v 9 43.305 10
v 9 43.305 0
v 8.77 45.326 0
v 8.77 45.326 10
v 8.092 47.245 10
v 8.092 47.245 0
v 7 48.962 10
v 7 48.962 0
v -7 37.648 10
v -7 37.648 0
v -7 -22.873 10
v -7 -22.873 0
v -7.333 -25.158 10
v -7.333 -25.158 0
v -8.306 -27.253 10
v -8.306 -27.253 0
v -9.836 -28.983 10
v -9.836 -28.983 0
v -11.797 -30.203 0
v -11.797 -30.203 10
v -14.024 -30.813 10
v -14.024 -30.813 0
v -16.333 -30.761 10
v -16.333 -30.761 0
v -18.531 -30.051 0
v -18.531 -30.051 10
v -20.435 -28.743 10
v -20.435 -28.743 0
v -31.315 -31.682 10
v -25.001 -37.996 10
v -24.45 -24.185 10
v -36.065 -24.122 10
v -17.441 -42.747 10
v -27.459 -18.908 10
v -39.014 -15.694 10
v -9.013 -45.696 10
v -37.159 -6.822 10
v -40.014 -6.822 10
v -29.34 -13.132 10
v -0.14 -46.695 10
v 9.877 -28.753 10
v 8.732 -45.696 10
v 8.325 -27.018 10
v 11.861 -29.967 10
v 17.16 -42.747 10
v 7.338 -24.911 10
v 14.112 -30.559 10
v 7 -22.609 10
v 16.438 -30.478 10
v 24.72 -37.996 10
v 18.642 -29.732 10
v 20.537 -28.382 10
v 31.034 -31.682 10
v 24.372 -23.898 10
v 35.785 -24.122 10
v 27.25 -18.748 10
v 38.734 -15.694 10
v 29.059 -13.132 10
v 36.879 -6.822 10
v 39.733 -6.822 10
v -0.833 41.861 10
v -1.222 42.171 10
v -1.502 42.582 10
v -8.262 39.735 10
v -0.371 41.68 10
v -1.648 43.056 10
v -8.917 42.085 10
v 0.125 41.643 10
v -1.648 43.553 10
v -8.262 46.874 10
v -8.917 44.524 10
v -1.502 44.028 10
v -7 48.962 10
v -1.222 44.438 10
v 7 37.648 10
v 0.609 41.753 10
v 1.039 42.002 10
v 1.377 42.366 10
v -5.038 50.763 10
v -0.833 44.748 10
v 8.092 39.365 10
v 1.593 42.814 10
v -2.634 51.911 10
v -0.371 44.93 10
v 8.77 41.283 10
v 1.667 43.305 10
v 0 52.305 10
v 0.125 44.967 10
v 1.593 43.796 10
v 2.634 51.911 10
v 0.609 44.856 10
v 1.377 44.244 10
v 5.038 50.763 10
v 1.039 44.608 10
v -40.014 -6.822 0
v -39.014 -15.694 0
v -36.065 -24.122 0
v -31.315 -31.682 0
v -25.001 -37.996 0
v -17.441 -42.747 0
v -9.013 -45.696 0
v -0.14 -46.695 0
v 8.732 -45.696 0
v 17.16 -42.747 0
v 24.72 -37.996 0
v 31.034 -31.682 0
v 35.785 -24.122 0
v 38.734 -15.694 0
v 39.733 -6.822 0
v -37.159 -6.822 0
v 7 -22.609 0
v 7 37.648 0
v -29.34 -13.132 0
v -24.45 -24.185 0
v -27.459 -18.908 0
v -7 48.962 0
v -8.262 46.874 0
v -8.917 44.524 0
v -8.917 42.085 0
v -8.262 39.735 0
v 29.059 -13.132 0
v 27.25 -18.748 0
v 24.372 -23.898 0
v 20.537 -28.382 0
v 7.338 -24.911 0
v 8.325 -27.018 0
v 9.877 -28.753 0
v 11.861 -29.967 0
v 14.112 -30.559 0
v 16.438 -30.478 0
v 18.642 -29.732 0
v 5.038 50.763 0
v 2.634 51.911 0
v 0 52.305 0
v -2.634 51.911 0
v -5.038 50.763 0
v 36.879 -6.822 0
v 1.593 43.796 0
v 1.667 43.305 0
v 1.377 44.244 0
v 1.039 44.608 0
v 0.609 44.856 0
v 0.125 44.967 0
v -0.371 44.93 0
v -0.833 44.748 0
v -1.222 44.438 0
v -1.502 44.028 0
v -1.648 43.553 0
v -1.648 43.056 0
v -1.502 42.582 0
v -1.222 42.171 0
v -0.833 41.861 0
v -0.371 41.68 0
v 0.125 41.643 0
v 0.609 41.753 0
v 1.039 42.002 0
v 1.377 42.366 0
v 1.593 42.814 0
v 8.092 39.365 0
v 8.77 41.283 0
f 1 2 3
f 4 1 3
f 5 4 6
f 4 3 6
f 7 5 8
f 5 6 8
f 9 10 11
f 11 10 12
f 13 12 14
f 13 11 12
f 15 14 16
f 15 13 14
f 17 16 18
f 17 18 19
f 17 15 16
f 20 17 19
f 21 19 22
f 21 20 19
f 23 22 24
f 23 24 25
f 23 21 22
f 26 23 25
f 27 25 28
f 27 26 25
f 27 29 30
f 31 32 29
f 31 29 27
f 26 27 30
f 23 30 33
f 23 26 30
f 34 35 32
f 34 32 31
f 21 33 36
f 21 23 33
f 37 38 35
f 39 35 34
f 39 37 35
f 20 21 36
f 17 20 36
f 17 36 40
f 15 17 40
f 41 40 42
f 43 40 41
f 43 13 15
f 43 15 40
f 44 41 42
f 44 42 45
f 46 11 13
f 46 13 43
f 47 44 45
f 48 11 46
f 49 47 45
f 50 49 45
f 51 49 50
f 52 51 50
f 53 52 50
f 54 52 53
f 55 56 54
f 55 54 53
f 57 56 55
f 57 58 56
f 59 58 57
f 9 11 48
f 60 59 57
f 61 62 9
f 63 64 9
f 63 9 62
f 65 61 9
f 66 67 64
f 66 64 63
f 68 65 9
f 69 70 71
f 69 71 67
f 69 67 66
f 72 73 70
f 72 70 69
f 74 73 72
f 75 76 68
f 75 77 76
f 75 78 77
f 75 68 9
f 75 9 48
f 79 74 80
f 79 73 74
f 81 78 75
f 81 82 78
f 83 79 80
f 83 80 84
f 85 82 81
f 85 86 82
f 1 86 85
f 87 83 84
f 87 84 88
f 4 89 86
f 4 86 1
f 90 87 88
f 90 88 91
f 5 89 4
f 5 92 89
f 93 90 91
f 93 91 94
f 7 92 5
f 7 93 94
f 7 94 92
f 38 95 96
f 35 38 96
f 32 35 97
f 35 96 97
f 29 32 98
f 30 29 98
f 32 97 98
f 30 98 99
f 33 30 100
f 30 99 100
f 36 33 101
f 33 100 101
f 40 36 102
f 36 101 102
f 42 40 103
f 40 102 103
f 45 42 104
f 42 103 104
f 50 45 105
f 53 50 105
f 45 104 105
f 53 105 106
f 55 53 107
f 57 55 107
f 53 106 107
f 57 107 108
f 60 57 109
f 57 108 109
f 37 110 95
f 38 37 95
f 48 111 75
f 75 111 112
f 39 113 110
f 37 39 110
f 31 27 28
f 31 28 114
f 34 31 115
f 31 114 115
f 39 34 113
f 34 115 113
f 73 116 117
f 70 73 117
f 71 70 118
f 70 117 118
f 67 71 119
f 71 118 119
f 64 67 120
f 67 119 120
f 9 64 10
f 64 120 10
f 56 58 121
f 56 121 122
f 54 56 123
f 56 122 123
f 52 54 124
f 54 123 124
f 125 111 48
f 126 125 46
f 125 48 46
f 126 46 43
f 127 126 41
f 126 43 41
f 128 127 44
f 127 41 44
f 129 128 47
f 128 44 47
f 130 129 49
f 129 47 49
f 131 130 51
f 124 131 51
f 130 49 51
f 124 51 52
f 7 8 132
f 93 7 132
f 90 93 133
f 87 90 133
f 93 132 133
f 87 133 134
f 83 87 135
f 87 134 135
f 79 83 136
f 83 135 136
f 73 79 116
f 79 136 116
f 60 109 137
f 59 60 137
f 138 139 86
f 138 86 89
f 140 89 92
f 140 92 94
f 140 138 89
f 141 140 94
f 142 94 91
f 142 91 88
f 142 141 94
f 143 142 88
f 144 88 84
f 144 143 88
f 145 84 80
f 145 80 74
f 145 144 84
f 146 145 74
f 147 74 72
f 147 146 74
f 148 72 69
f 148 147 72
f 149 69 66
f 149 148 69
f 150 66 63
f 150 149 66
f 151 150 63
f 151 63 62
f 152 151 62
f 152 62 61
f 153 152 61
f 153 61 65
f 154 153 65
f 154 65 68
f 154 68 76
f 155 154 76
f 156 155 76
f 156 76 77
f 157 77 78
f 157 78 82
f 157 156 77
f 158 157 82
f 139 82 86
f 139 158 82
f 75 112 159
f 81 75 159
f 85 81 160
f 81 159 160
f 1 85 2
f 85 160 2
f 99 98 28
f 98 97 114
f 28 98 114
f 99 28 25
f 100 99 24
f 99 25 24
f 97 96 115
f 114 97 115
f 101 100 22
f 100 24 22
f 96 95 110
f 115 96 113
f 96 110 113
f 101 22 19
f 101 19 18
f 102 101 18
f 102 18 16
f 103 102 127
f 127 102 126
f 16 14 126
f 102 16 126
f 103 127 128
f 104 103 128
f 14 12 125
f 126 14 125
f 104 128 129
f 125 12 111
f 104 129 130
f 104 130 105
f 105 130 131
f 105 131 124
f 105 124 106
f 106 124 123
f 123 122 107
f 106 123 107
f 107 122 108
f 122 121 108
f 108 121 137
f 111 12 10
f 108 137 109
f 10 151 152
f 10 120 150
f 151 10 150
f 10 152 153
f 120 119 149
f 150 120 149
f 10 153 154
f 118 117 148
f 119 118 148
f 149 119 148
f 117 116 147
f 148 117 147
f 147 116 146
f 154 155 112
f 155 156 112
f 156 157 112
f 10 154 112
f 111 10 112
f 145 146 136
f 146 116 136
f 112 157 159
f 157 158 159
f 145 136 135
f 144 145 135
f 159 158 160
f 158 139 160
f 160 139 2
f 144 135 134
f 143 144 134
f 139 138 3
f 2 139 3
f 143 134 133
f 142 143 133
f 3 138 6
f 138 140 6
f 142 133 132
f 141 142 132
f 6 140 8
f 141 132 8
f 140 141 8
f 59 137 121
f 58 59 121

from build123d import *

# Parameters (mm, degrees)
F1_R        = 1.6666666667
F2_DEPTH    = 10
F3_T1_DEPTH = 46.985990025
F4_R        = 8


# Not quite as in the source:
# - a fillet or chamfer that OpenCascade refuses, or shapes differently, is made with other operations: its cross-section is extruded or revolved along the edge and cut away or added
# - a feature names something its author has since deleted; it is built from what else it names


with BuildPart() as f2:
    # F1 (on Top) → F2 (new body)
    with BuildSketch(Plane.XY):
        with BuildLine():
            ThreePointArc((7, 48.9616353347), (0, 52.3047810852), (-7, 48.9616353347))
            Line((-7, 48.9616353347), (7, 48.9616353347))
        make_face()
        with BuildLine():
            Line((7, 48.9616353347), (-7, 48.9616353347))
            Line((-7, 48.9616353347), (-7, 37.6479268357))
            ThreePointArc((-7, 37.6479268357), (0, 34.3047810852), (7, 37.6479268357))
            Line((7, 37.6479268357), (7, 48.9616353347))
        make_face()
        with Locations((0, 43.3047810852)):
            Circle(F1_R, mode=Mode.SUBTRACT)
        with BuildLine():
            Line((-7, 37.6479268357), (-7, 48.9616353347))
            ThreePointArc((-7, 48.9616353347), (-9, 43.3047810852), (-7, 37.6479268357))
        make_face()
        with BuildLine():
            ThreePointArc((9, 43.3047810852), (8.4852813742, 46.3047810852), (7, 48.9616353347))
            Line((7, 48.9616353347), (7, 37.6479268357))
            ThreePointArc((7, 37.6479268357), (8.4852813742, 40.3047810852), (9, 43.3047810852))
        make_face()
        with BuildLine():
            ThreePointArc((7, 37.6479268357), (0, 34.3047810852), (-7, 37.6479268357))
            Line((-7, 37.6479268357), (-7, -35.8969497675))
            ThreePointArc((-7, -35.8969497675), (0.0040151824, -36.6948708101), (7, -35.8293633875))
            Line((7, -35.8293633875), (7, 37.6479268357))
        make_face()
        with BuildLine():
            ThreePointArc((7, -35.8293633875), (0.0040151824, -36.6948708101), (-7, -35.8969497675))
            ThreePointArc((-7, -35.8969497675), (-23.5639927575, -25.3622297337), (-30.0136384001, -6.8217806199))
            Line((-30.0136384001, -6.8217806199), (-39.6402001052, -6.8217806199))
            Line((-39.6402001052, -6.8217806199), (-40.0136384001, -6.8217806199))
            ThreePointArc((-40.0136384001, -6.8217806199), (-0.1402001052, -46.6952189148), (39.7332381897, -6.8217806199))
            Line((39.7332381897, -6.8217806199), (29.7332381897, -6.8217806199))
            ThreePointArc((29.7332381897, -6.8217806199), (23.3728244006, -25.248934338), (7, -35.8293633875))
        make_face()
    extrude(amount=F2_DEPTH)

    # F3: chamfer of 8 on 2 edges, made by hand

    # F3_s2 → F3_t1 (cut)
    with BuildSketch(Plane.XY.offset(-18.4929950125)):
        with BuildLine():
            Line((-29.3395867315, -13.1319419656), (-37.1590781039, -6.8217806199))
            Line((-37.1590781039, -6.8217806199), (-30.0136384001, -6.8217806199))
            ThreePointArc((-30.0136384001, -6.8217806199), (-29.8322989719, -10.108356414), (-29.3395867315, -13.1319419656))
        make_face()
        with BuildLine():
            Line((36.8786778935, -6.8217806199), (29.0591865211, -13.1319419656))
            ThreePointArc((29.0591865211, -13.1319419656), (29.5518987615, -10.108356414), (29.7332381897, -6.8217806199))
            Line((29.7332381897, -6.8217806199), (36.8786778935, -6.8217806199))
        make_face()
    extrude(amount=F3_T1_DEPTH, mode=Mode.SUBTRACT)

    # F4
    f4_edges = [f2.edges().sort_by_distance(p)[0] for p in [
        (-7, -35.89695, 5),
        (7, -35.829363, 5),
    ]]
    fillet(f4_edges, radius=F4_R)


solid = f2.part
